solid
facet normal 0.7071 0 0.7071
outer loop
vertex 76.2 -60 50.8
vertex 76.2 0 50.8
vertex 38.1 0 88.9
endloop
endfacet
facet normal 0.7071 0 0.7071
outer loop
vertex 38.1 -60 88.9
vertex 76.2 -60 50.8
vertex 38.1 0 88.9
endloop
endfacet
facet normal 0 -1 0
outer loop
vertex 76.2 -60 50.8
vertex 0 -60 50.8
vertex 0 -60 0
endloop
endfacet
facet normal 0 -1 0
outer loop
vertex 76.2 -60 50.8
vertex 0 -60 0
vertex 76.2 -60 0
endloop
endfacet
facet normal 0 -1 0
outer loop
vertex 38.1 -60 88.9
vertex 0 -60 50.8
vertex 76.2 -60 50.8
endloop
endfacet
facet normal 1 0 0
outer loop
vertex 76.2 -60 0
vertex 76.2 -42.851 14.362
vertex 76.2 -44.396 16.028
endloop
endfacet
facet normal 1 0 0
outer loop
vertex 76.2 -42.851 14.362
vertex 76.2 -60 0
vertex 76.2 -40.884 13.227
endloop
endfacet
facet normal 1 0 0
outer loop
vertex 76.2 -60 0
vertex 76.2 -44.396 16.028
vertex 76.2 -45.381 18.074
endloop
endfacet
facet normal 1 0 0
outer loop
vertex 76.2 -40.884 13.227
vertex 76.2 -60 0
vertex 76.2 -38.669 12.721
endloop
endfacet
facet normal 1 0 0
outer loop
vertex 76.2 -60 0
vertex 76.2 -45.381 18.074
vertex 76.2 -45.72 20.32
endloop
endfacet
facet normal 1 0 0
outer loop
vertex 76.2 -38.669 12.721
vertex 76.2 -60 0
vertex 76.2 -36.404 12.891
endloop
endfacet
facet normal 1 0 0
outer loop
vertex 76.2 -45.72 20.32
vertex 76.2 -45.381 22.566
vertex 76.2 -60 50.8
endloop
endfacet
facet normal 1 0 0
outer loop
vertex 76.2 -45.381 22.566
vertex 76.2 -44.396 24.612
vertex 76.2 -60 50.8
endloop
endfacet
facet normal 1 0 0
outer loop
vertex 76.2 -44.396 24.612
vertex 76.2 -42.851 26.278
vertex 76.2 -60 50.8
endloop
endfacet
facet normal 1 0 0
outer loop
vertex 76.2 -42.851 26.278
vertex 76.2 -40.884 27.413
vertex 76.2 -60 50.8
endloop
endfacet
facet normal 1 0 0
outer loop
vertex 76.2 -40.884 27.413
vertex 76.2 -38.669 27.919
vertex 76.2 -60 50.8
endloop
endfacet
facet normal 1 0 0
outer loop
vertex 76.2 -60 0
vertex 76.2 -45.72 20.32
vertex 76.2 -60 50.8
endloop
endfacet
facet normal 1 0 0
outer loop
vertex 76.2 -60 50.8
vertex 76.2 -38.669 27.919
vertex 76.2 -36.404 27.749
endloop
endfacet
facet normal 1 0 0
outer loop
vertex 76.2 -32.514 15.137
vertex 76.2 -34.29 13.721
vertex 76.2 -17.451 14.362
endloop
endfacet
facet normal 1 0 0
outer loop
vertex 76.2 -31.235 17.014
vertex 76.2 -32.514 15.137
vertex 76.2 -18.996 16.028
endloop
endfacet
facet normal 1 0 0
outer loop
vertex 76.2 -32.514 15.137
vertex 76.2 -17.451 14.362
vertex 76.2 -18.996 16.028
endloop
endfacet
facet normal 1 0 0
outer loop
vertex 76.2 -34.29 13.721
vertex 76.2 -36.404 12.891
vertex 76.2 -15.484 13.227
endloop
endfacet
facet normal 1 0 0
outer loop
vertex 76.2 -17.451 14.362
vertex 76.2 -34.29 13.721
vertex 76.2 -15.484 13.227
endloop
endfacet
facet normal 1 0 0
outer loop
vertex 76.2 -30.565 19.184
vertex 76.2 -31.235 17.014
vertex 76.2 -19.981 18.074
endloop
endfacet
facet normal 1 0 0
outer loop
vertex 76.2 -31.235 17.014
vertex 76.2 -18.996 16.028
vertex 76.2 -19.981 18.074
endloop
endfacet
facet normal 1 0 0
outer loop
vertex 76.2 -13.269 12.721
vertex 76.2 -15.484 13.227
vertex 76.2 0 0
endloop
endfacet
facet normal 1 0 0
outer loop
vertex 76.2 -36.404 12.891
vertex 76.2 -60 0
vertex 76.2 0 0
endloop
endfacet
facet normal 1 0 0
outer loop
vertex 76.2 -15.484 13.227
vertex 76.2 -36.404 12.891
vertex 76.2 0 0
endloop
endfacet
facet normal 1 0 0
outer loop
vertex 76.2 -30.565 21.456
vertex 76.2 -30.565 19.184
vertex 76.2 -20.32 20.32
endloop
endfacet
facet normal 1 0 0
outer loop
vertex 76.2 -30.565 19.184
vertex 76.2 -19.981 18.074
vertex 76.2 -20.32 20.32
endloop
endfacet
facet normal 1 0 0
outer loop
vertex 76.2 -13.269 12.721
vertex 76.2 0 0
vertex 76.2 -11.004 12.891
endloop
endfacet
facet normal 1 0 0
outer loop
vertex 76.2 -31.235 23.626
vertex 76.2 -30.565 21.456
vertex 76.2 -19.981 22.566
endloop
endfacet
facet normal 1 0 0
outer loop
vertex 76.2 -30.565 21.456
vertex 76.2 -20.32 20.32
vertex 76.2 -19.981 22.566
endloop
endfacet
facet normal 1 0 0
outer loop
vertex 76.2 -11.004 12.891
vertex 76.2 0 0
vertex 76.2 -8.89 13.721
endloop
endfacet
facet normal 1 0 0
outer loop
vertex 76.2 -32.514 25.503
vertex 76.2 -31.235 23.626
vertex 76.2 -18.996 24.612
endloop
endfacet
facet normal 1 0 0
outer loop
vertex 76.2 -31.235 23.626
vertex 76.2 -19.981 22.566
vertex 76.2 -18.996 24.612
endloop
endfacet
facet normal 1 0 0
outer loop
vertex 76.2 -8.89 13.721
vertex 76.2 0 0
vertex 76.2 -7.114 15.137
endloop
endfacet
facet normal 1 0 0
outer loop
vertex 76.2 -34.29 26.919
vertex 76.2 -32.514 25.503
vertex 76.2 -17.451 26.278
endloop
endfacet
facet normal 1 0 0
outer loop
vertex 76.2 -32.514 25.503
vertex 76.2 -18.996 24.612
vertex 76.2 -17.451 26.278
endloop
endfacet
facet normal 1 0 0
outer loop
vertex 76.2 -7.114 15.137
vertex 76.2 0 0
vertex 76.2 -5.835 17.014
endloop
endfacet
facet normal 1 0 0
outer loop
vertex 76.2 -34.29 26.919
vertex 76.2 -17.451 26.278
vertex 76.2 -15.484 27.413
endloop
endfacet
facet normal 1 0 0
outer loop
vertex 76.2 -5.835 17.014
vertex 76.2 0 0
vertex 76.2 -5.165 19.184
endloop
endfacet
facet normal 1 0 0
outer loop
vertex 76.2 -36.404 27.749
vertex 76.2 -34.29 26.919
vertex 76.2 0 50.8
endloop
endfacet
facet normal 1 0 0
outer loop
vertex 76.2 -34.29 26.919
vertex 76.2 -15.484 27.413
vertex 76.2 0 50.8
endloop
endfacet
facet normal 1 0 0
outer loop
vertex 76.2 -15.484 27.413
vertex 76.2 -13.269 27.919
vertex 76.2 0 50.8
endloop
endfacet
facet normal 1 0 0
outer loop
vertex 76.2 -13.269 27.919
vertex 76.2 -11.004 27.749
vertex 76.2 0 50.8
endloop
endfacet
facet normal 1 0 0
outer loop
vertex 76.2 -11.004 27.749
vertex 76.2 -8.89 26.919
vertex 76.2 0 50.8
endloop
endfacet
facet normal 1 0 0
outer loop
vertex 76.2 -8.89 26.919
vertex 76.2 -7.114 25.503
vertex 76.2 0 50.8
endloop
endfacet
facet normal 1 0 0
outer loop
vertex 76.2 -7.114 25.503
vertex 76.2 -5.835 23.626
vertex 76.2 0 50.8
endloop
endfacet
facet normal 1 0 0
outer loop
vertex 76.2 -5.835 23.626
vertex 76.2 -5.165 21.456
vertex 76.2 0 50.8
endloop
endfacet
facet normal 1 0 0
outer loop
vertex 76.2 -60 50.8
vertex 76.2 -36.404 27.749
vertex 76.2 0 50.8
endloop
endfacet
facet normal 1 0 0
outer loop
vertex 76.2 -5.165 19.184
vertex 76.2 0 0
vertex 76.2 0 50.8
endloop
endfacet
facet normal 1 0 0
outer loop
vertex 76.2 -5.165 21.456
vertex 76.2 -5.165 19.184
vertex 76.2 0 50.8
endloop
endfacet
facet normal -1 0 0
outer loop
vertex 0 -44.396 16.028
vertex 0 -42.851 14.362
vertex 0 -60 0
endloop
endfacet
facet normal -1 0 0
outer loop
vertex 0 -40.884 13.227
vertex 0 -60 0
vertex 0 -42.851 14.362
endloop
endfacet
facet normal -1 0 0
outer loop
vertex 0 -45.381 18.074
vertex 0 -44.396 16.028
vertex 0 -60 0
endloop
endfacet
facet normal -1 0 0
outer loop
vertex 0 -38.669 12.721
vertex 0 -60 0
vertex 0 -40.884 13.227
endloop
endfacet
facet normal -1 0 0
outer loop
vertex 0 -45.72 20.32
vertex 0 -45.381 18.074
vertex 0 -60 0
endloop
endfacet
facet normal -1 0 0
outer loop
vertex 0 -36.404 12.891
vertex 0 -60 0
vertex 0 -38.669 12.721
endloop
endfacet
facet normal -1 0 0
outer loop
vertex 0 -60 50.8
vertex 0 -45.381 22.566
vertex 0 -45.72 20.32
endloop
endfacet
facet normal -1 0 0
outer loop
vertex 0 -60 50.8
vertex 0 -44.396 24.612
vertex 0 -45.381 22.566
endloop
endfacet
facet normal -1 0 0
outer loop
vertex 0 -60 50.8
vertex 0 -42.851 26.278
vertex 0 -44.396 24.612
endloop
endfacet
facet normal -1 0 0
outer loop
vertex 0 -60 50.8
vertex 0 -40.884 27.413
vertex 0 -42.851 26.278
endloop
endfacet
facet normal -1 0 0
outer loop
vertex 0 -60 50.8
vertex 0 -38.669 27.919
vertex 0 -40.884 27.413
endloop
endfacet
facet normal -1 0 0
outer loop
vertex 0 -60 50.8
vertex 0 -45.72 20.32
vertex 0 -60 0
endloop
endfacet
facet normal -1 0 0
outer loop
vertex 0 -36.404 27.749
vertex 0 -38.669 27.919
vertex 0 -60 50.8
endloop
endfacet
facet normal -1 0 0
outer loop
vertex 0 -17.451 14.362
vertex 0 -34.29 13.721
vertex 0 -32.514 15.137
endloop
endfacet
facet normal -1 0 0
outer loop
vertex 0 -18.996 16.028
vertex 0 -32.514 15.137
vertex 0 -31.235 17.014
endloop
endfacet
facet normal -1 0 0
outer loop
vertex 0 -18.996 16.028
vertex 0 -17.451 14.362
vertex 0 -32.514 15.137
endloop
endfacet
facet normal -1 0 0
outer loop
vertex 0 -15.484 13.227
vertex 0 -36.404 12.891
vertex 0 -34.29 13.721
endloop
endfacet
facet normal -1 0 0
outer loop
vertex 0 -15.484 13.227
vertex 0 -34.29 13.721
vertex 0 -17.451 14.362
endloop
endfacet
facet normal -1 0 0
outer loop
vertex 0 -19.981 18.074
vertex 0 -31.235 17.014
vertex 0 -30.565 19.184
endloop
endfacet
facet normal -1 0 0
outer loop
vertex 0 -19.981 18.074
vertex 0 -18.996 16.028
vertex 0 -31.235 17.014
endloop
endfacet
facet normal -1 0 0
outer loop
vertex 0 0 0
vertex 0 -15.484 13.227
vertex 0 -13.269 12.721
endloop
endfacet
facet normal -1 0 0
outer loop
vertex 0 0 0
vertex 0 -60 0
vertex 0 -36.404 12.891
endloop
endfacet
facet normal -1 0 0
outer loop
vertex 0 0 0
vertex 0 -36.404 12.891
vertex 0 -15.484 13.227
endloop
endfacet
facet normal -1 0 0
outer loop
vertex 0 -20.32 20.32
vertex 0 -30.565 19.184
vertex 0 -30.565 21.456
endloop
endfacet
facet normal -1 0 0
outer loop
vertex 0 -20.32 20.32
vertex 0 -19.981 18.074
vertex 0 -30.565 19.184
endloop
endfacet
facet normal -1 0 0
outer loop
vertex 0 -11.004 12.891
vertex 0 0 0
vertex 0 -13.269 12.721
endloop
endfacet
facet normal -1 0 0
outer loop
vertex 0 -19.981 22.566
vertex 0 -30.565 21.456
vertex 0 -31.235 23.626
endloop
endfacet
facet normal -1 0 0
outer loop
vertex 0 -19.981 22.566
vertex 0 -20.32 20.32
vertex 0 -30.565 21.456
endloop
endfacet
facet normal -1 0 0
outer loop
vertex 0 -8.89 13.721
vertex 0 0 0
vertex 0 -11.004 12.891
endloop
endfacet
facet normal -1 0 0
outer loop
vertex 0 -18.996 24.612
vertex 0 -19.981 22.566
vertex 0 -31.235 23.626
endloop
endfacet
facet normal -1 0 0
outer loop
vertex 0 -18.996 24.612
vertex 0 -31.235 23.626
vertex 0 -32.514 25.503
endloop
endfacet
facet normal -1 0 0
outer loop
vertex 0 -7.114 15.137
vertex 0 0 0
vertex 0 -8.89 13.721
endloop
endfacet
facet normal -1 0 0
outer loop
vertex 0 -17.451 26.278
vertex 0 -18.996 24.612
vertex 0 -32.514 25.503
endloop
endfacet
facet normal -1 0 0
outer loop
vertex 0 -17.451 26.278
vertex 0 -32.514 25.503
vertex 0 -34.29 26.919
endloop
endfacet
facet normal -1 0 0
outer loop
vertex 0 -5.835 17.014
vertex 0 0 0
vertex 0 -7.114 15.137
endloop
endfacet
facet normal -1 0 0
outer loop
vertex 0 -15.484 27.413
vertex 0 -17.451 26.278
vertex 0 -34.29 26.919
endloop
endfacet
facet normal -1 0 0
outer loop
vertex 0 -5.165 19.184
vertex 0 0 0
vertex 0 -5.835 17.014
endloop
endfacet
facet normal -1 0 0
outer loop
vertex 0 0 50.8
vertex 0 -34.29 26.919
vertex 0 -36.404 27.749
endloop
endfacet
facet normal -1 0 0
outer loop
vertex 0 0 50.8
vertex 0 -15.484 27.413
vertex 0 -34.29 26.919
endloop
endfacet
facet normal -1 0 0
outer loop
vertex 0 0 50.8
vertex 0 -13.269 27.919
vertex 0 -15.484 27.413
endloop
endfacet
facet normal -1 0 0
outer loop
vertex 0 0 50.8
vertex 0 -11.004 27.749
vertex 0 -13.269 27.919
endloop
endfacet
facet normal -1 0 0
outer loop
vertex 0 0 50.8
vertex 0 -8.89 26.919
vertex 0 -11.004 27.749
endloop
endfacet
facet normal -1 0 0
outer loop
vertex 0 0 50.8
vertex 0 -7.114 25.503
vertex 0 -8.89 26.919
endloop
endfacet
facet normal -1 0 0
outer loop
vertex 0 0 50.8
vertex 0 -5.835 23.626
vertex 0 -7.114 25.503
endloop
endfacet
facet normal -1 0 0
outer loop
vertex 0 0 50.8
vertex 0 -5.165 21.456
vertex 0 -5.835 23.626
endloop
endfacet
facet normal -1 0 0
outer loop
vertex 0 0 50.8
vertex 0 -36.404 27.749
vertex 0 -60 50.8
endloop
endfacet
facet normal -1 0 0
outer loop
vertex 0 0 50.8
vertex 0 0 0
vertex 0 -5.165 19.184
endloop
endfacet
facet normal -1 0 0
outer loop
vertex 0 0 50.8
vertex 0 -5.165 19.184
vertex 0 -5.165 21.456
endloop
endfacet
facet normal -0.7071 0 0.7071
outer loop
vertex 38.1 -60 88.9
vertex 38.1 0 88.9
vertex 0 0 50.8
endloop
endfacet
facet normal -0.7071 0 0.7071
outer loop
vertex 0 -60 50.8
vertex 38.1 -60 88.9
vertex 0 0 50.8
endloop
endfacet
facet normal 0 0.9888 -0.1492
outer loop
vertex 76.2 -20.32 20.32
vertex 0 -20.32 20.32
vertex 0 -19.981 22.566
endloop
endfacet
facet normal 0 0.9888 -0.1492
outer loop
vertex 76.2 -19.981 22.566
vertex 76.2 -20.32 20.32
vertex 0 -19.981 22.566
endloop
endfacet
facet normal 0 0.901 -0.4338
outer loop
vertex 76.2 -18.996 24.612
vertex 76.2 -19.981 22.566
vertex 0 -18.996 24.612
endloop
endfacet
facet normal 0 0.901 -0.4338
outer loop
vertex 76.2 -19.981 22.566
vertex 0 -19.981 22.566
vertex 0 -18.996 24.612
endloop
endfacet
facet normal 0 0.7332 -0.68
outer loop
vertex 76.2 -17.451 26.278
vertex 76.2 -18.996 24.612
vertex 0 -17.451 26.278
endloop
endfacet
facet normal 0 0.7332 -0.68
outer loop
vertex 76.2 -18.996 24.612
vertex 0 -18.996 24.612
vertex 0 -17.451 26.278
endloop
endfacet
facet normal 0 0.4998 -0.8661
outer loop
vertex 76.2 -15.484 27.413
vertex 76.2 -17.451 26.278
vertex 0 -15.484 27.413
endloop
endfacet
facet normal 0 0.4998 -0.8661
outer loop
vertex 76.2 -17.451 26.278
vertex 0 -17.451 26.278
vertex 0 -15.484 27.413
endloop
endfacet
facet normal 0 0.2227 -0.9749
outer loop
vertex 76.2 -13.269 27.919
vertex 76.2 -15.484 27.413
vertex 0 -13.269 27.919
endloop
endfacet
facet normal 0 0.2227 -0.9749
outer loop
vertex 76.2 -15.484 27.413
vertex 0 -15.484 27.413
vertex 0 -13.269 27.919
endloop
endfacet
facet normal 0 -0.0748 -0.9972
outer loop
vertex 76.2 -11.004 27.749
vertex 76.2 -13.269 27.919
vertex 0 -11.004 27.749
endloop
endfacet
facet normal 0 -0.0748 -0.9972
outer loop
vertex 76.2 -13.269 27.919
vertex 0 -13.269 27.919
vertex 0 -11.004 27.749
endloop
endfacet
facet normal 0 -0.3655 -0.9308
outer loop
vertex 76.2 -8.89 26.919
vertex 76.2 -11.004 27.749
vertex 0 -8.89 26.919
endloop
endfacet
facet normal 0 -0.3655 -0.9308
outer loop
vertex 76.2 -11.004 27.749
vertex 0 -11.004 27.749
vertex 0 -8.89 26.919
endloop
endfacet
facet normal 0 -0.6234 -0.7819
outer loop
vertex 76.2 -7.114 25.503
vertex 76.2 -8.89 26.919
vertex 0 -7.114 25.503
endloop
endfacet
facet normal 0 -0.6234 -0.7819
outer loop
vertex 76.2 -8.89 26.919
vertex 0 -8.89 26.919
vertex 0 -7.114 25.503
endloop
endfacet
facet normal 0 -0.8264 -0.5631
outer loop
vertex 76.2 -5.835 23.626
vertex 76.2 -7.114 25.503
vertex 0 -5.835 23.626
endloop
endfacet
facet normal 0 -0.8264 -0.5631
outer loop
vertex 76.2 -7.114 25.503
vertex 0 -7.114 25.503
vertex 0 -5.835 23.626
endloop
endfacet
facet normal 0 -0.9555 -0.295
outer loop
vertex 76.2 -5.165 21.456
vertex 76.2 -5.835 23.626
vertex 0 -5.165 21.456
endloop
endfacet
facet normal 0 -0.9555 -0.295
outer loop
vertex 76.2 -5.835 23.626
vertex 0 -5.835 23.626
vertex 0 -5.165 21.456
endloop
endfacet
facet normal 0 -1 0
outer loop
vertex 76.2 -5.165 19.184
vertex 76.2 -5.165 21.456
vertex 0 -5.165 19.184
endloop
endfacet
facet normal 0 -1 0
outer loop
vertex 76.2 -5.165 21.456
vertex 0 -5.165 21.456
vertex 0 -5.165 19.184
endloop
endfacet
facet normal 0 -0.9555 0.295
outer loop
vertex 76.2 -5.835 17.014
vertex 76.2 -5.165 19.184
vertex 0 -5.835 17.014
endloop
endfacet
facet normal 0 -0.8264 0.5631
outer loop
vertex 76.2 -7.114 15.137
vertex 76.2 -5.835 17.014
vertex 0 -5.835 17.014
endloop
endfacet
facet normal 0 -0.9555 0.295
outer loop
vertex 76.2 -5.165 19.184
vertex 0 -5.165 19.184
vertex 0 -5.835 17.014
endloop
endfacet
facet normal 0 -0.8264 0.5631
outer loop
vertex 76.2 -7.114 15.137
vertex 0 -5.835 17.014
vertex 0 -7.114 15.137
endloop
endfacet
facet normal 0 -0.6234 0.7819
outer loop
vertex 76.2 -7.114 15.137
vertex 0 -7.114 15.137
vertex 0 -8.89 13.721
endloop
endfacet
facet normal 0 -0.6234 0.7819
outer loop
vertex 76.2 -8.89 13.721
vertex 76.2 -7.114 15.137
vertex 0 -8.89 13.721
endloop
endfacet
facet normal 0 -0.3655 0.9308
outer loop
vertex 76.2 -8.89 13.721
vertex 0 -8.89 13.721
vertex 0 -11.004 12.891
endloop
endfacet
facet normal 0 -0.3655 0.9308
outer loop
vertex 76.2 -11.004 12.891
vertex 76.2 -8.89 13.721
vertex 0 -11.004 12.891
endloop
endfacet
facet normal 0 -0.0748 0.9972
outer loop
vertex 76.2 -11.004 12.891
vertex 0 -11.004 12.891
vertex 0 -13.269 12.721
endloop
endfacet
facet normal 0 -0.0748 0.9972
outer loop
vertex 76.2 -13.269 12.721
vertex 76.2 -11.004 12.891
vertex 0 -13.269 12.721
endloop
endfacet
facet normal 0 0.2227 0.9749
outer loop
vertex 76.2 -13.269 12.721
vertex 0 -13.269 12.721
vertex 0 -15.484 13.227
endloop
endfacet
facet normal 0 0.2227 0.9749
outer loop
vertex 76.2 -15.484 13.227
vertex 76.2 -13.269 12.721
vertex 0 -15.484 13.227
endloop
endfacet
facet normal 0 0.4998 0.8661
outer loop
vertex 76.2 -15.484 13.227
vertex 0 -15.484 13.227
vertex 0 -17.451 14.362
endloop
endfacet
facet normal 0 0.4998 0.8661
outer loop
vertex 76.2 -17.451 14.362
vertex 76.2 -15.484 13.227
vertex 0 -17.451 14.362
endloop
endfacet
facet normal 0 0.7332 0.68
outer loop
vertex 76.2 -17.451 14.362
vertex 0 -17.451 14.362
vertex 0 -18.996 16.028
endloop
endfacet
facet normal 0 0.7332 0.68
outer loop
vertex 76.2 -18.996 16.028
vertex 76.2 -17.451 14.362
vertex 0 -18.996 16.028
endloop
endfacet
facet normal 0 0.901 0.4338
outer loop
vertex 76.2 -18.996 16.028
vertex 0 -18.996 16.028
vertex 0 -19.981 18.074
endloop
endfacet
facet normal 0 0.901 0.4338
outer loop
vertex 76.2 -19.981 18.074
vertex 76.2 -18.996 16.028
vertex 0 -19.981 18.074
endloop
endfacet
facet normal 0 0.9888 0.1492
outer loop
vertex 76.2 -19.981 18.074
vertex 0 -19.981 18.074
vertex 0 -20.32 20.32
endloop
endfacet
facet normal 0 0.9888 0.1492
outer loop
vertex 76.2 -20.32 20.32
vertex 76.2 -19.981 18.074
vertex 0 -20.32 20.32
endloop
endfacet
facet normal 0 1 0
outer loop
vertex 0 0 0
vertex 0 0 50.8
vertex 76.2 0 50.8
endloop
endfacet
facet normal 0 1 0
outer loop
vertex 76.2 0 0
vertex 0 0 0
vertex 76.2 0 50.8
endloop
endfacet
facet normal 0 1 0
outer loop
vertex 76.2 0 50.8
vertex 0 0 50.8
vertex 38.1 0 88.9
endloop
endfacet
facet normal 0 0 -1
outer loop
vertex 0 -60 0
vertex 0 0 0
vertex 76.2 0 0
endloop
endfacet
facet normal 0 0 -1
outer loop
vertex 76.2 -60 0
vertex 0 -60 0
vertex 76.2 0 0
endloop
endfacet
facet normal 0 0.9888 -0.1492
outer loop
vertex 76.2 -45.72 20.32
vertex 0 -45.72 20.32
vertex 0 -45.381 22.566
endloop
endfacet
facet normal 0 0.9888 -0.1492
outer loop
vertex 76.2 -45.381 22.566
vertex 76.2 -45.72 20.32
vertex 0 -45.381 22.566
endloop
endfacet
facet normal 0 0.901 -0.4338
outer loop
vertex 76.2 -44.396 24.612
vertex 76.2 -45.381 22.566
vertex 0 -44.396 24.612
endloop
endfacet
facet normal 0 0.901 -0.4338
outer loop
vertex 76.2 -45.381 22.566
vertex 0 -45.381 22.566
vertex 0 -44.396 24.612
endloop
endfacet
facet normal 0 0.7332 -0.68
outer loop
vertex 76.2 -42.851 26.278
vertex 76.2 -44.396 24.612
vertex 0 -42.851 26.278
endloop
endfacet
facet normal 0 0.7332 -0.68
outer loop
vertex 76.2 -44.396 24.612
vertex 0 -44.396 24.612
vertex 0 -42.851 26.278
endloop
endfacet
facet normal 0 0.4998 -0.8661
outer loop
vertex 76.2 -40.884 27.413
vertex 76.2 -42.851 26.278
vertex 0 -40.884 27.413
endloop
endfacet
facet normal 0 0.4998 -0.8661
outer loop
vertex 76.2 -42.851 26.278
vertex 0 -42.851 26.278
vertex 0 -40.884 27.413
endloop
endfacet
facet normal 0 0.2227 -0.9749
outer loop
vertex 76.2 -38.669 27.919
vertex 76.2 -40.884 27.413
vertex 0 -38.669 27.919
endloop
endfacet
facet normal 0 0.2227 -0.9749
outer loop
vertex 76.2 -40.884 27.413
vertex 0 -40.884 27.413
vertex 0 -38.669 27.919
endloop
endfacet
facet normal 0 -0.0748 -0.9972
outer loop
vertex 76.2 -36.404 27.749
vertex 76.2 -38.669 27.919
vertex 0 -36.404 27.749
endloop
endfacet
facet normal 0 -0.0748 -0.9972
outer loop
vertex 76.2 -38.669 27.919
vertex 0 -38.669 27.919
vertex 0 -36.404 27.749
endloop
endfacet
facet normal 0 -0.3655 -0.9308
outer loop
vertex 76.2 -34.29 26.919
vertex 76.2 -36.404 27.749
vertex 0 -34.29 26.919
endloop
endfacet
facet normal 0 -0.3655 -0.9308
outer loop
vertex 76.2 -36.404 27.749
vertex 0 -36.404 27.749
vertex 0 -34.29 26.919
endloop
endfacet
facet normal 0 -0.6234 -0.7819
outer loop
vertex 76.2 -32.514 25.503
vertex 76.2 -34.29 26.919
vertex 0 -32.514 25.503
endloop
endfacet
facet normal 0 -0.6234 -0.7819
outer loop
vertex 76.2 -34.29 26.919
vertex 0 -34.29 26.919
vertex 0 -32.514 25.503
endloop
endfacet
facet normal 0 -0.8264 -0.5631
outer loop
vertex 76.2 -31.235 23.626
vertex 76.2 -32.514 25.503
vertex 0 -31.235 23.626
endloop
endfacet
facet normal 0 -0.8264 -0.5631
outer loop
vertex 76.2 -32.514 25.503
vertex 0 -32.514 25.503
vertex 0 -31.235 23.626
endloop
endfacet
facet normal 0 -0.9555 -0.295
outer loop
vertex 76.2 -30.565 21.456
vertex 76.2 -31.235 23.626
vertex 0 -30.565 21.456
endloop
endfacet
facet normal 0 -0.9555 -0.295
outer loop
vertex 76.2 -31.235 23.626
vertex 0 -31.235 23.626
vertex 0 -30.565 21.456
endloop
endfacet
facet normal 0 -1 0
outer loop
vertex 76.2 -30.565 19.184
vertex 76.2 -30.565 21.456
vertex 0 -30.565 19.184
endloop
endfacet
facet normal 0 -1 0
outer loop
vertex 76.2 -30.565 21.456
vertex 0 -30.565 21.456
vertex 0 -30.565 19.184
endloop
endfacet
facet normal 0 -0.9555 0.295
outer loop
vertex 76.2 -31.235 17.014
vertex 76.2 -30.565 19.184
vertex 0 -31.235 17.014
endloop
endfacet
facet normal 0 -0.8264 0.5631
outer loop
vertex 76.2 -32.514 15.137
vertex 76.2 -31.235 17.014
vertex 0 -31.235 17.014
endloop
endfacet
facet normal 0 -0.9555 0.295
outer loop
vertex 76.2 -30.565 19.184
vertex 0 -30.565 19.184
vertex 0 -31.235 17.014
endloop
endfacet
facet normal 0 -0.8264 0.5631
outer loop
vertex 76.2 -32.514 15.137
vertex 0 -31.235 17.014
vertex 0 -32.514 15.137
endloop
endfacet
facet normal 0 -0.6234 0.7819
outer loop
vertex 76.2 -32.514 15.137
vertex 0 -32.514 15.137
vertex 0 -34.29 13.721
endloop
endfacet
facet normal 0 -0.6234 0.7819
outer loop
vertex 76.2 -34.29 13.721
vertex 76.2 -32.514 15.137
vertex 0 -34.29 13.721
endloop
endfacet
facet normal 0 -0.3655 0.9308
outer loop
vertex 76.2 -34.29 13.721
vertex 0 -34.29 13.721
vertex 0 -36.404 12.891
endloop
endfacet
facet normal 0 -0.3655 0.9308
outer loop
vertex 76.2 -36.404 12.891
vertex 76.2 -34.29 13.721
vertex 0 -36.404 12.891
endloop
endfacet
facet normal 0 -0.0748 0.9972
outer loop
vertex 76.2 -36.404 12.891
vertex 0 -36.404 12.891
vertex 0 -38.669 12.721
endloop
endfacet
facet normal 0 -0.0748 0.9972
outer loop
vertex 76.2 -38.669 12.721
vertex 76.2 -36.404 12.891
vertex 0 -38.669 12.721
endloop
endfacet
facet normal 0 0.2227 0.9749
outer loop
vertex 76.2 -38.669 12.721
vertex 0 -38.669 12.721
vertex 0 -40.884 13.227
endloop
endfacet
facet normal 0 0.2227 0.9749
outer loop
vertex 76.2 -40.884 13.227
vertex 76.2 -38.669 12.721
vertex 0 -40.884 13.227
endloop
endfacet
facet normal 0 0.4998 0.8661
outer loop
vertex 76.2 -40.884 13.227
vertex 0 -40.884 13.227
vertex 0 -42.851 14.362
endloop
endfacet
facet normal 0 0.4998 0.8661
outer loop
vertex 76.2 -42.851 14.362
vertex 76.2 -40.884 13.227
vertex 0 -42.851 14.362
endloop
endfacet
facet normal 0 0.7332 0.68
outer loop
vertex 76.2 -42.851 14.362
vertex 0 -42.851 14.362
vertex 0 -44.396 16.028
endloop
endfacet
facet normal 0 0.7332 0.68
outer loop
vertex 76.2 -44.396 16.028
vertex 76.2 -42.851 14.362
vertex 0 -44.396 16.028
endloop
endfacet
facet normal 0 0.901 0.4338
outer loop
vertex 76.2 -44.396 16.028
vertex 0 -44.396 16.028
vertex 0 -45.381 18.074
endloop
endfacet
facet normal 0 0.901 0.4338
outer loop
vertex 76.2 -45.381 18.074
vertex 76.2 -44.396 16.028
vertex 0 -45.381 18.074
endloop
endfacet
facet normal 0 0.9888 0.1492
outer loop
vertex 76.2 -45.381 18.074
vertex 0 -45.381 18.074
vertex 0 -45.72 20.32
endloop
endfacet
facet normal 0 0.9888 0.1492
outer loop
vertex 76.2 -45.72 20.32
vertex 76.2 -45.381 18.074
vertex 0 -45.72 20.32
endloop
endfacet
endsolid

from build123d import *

# Parameters (mm, degrees)
F0_W     = 76.2
F0_H     = 50.8
F1_DEPTH = 60
F2_R     = 7.62
F3_DEPTH = 76.201
F4_DEPTH = 76.201


with BuildPart() as f1:
    # F0 (on Front) → F1 (new body)
    with BuildSketch(Plane.XZ):
        with Locations((38.1, 25.4)):
            Rectangle(F0_W, F0_H)
        Polygon((38.1, 88.9), (0, 50.8), (76.2, 50.8), align=None)
    extrude(amount=F1_DEPTH)

    # F2 (on face) → F3 (cut, through all)
    with BuildSketch(Plane(origin=(0, 0, 0), x_dir=(0, -1, 0), z_dir=(-1, 0, 0))):
        with Locations((12.7, 20.32)):
            Circle(F2_R)
    extrude(amount=-F3_DEPTH, mode=Mode.SUBTRACT)

    # F2 (on face) → F4 (cut, through all)
    with BuildSketch(Plane(origin=(0, 0, 0), x_dir=(0, -1, 0), z_dir=(-1, 0, 0))):
        with Locations((12.7, 20.32)):
            Circle(F2_R)
        with Locations((38.1, 20.32)):
            Circle(F2_R)
    extrude(amount=-F4_DEPTH, mode=Mode.SUBTRACT)


solid = f1.part
